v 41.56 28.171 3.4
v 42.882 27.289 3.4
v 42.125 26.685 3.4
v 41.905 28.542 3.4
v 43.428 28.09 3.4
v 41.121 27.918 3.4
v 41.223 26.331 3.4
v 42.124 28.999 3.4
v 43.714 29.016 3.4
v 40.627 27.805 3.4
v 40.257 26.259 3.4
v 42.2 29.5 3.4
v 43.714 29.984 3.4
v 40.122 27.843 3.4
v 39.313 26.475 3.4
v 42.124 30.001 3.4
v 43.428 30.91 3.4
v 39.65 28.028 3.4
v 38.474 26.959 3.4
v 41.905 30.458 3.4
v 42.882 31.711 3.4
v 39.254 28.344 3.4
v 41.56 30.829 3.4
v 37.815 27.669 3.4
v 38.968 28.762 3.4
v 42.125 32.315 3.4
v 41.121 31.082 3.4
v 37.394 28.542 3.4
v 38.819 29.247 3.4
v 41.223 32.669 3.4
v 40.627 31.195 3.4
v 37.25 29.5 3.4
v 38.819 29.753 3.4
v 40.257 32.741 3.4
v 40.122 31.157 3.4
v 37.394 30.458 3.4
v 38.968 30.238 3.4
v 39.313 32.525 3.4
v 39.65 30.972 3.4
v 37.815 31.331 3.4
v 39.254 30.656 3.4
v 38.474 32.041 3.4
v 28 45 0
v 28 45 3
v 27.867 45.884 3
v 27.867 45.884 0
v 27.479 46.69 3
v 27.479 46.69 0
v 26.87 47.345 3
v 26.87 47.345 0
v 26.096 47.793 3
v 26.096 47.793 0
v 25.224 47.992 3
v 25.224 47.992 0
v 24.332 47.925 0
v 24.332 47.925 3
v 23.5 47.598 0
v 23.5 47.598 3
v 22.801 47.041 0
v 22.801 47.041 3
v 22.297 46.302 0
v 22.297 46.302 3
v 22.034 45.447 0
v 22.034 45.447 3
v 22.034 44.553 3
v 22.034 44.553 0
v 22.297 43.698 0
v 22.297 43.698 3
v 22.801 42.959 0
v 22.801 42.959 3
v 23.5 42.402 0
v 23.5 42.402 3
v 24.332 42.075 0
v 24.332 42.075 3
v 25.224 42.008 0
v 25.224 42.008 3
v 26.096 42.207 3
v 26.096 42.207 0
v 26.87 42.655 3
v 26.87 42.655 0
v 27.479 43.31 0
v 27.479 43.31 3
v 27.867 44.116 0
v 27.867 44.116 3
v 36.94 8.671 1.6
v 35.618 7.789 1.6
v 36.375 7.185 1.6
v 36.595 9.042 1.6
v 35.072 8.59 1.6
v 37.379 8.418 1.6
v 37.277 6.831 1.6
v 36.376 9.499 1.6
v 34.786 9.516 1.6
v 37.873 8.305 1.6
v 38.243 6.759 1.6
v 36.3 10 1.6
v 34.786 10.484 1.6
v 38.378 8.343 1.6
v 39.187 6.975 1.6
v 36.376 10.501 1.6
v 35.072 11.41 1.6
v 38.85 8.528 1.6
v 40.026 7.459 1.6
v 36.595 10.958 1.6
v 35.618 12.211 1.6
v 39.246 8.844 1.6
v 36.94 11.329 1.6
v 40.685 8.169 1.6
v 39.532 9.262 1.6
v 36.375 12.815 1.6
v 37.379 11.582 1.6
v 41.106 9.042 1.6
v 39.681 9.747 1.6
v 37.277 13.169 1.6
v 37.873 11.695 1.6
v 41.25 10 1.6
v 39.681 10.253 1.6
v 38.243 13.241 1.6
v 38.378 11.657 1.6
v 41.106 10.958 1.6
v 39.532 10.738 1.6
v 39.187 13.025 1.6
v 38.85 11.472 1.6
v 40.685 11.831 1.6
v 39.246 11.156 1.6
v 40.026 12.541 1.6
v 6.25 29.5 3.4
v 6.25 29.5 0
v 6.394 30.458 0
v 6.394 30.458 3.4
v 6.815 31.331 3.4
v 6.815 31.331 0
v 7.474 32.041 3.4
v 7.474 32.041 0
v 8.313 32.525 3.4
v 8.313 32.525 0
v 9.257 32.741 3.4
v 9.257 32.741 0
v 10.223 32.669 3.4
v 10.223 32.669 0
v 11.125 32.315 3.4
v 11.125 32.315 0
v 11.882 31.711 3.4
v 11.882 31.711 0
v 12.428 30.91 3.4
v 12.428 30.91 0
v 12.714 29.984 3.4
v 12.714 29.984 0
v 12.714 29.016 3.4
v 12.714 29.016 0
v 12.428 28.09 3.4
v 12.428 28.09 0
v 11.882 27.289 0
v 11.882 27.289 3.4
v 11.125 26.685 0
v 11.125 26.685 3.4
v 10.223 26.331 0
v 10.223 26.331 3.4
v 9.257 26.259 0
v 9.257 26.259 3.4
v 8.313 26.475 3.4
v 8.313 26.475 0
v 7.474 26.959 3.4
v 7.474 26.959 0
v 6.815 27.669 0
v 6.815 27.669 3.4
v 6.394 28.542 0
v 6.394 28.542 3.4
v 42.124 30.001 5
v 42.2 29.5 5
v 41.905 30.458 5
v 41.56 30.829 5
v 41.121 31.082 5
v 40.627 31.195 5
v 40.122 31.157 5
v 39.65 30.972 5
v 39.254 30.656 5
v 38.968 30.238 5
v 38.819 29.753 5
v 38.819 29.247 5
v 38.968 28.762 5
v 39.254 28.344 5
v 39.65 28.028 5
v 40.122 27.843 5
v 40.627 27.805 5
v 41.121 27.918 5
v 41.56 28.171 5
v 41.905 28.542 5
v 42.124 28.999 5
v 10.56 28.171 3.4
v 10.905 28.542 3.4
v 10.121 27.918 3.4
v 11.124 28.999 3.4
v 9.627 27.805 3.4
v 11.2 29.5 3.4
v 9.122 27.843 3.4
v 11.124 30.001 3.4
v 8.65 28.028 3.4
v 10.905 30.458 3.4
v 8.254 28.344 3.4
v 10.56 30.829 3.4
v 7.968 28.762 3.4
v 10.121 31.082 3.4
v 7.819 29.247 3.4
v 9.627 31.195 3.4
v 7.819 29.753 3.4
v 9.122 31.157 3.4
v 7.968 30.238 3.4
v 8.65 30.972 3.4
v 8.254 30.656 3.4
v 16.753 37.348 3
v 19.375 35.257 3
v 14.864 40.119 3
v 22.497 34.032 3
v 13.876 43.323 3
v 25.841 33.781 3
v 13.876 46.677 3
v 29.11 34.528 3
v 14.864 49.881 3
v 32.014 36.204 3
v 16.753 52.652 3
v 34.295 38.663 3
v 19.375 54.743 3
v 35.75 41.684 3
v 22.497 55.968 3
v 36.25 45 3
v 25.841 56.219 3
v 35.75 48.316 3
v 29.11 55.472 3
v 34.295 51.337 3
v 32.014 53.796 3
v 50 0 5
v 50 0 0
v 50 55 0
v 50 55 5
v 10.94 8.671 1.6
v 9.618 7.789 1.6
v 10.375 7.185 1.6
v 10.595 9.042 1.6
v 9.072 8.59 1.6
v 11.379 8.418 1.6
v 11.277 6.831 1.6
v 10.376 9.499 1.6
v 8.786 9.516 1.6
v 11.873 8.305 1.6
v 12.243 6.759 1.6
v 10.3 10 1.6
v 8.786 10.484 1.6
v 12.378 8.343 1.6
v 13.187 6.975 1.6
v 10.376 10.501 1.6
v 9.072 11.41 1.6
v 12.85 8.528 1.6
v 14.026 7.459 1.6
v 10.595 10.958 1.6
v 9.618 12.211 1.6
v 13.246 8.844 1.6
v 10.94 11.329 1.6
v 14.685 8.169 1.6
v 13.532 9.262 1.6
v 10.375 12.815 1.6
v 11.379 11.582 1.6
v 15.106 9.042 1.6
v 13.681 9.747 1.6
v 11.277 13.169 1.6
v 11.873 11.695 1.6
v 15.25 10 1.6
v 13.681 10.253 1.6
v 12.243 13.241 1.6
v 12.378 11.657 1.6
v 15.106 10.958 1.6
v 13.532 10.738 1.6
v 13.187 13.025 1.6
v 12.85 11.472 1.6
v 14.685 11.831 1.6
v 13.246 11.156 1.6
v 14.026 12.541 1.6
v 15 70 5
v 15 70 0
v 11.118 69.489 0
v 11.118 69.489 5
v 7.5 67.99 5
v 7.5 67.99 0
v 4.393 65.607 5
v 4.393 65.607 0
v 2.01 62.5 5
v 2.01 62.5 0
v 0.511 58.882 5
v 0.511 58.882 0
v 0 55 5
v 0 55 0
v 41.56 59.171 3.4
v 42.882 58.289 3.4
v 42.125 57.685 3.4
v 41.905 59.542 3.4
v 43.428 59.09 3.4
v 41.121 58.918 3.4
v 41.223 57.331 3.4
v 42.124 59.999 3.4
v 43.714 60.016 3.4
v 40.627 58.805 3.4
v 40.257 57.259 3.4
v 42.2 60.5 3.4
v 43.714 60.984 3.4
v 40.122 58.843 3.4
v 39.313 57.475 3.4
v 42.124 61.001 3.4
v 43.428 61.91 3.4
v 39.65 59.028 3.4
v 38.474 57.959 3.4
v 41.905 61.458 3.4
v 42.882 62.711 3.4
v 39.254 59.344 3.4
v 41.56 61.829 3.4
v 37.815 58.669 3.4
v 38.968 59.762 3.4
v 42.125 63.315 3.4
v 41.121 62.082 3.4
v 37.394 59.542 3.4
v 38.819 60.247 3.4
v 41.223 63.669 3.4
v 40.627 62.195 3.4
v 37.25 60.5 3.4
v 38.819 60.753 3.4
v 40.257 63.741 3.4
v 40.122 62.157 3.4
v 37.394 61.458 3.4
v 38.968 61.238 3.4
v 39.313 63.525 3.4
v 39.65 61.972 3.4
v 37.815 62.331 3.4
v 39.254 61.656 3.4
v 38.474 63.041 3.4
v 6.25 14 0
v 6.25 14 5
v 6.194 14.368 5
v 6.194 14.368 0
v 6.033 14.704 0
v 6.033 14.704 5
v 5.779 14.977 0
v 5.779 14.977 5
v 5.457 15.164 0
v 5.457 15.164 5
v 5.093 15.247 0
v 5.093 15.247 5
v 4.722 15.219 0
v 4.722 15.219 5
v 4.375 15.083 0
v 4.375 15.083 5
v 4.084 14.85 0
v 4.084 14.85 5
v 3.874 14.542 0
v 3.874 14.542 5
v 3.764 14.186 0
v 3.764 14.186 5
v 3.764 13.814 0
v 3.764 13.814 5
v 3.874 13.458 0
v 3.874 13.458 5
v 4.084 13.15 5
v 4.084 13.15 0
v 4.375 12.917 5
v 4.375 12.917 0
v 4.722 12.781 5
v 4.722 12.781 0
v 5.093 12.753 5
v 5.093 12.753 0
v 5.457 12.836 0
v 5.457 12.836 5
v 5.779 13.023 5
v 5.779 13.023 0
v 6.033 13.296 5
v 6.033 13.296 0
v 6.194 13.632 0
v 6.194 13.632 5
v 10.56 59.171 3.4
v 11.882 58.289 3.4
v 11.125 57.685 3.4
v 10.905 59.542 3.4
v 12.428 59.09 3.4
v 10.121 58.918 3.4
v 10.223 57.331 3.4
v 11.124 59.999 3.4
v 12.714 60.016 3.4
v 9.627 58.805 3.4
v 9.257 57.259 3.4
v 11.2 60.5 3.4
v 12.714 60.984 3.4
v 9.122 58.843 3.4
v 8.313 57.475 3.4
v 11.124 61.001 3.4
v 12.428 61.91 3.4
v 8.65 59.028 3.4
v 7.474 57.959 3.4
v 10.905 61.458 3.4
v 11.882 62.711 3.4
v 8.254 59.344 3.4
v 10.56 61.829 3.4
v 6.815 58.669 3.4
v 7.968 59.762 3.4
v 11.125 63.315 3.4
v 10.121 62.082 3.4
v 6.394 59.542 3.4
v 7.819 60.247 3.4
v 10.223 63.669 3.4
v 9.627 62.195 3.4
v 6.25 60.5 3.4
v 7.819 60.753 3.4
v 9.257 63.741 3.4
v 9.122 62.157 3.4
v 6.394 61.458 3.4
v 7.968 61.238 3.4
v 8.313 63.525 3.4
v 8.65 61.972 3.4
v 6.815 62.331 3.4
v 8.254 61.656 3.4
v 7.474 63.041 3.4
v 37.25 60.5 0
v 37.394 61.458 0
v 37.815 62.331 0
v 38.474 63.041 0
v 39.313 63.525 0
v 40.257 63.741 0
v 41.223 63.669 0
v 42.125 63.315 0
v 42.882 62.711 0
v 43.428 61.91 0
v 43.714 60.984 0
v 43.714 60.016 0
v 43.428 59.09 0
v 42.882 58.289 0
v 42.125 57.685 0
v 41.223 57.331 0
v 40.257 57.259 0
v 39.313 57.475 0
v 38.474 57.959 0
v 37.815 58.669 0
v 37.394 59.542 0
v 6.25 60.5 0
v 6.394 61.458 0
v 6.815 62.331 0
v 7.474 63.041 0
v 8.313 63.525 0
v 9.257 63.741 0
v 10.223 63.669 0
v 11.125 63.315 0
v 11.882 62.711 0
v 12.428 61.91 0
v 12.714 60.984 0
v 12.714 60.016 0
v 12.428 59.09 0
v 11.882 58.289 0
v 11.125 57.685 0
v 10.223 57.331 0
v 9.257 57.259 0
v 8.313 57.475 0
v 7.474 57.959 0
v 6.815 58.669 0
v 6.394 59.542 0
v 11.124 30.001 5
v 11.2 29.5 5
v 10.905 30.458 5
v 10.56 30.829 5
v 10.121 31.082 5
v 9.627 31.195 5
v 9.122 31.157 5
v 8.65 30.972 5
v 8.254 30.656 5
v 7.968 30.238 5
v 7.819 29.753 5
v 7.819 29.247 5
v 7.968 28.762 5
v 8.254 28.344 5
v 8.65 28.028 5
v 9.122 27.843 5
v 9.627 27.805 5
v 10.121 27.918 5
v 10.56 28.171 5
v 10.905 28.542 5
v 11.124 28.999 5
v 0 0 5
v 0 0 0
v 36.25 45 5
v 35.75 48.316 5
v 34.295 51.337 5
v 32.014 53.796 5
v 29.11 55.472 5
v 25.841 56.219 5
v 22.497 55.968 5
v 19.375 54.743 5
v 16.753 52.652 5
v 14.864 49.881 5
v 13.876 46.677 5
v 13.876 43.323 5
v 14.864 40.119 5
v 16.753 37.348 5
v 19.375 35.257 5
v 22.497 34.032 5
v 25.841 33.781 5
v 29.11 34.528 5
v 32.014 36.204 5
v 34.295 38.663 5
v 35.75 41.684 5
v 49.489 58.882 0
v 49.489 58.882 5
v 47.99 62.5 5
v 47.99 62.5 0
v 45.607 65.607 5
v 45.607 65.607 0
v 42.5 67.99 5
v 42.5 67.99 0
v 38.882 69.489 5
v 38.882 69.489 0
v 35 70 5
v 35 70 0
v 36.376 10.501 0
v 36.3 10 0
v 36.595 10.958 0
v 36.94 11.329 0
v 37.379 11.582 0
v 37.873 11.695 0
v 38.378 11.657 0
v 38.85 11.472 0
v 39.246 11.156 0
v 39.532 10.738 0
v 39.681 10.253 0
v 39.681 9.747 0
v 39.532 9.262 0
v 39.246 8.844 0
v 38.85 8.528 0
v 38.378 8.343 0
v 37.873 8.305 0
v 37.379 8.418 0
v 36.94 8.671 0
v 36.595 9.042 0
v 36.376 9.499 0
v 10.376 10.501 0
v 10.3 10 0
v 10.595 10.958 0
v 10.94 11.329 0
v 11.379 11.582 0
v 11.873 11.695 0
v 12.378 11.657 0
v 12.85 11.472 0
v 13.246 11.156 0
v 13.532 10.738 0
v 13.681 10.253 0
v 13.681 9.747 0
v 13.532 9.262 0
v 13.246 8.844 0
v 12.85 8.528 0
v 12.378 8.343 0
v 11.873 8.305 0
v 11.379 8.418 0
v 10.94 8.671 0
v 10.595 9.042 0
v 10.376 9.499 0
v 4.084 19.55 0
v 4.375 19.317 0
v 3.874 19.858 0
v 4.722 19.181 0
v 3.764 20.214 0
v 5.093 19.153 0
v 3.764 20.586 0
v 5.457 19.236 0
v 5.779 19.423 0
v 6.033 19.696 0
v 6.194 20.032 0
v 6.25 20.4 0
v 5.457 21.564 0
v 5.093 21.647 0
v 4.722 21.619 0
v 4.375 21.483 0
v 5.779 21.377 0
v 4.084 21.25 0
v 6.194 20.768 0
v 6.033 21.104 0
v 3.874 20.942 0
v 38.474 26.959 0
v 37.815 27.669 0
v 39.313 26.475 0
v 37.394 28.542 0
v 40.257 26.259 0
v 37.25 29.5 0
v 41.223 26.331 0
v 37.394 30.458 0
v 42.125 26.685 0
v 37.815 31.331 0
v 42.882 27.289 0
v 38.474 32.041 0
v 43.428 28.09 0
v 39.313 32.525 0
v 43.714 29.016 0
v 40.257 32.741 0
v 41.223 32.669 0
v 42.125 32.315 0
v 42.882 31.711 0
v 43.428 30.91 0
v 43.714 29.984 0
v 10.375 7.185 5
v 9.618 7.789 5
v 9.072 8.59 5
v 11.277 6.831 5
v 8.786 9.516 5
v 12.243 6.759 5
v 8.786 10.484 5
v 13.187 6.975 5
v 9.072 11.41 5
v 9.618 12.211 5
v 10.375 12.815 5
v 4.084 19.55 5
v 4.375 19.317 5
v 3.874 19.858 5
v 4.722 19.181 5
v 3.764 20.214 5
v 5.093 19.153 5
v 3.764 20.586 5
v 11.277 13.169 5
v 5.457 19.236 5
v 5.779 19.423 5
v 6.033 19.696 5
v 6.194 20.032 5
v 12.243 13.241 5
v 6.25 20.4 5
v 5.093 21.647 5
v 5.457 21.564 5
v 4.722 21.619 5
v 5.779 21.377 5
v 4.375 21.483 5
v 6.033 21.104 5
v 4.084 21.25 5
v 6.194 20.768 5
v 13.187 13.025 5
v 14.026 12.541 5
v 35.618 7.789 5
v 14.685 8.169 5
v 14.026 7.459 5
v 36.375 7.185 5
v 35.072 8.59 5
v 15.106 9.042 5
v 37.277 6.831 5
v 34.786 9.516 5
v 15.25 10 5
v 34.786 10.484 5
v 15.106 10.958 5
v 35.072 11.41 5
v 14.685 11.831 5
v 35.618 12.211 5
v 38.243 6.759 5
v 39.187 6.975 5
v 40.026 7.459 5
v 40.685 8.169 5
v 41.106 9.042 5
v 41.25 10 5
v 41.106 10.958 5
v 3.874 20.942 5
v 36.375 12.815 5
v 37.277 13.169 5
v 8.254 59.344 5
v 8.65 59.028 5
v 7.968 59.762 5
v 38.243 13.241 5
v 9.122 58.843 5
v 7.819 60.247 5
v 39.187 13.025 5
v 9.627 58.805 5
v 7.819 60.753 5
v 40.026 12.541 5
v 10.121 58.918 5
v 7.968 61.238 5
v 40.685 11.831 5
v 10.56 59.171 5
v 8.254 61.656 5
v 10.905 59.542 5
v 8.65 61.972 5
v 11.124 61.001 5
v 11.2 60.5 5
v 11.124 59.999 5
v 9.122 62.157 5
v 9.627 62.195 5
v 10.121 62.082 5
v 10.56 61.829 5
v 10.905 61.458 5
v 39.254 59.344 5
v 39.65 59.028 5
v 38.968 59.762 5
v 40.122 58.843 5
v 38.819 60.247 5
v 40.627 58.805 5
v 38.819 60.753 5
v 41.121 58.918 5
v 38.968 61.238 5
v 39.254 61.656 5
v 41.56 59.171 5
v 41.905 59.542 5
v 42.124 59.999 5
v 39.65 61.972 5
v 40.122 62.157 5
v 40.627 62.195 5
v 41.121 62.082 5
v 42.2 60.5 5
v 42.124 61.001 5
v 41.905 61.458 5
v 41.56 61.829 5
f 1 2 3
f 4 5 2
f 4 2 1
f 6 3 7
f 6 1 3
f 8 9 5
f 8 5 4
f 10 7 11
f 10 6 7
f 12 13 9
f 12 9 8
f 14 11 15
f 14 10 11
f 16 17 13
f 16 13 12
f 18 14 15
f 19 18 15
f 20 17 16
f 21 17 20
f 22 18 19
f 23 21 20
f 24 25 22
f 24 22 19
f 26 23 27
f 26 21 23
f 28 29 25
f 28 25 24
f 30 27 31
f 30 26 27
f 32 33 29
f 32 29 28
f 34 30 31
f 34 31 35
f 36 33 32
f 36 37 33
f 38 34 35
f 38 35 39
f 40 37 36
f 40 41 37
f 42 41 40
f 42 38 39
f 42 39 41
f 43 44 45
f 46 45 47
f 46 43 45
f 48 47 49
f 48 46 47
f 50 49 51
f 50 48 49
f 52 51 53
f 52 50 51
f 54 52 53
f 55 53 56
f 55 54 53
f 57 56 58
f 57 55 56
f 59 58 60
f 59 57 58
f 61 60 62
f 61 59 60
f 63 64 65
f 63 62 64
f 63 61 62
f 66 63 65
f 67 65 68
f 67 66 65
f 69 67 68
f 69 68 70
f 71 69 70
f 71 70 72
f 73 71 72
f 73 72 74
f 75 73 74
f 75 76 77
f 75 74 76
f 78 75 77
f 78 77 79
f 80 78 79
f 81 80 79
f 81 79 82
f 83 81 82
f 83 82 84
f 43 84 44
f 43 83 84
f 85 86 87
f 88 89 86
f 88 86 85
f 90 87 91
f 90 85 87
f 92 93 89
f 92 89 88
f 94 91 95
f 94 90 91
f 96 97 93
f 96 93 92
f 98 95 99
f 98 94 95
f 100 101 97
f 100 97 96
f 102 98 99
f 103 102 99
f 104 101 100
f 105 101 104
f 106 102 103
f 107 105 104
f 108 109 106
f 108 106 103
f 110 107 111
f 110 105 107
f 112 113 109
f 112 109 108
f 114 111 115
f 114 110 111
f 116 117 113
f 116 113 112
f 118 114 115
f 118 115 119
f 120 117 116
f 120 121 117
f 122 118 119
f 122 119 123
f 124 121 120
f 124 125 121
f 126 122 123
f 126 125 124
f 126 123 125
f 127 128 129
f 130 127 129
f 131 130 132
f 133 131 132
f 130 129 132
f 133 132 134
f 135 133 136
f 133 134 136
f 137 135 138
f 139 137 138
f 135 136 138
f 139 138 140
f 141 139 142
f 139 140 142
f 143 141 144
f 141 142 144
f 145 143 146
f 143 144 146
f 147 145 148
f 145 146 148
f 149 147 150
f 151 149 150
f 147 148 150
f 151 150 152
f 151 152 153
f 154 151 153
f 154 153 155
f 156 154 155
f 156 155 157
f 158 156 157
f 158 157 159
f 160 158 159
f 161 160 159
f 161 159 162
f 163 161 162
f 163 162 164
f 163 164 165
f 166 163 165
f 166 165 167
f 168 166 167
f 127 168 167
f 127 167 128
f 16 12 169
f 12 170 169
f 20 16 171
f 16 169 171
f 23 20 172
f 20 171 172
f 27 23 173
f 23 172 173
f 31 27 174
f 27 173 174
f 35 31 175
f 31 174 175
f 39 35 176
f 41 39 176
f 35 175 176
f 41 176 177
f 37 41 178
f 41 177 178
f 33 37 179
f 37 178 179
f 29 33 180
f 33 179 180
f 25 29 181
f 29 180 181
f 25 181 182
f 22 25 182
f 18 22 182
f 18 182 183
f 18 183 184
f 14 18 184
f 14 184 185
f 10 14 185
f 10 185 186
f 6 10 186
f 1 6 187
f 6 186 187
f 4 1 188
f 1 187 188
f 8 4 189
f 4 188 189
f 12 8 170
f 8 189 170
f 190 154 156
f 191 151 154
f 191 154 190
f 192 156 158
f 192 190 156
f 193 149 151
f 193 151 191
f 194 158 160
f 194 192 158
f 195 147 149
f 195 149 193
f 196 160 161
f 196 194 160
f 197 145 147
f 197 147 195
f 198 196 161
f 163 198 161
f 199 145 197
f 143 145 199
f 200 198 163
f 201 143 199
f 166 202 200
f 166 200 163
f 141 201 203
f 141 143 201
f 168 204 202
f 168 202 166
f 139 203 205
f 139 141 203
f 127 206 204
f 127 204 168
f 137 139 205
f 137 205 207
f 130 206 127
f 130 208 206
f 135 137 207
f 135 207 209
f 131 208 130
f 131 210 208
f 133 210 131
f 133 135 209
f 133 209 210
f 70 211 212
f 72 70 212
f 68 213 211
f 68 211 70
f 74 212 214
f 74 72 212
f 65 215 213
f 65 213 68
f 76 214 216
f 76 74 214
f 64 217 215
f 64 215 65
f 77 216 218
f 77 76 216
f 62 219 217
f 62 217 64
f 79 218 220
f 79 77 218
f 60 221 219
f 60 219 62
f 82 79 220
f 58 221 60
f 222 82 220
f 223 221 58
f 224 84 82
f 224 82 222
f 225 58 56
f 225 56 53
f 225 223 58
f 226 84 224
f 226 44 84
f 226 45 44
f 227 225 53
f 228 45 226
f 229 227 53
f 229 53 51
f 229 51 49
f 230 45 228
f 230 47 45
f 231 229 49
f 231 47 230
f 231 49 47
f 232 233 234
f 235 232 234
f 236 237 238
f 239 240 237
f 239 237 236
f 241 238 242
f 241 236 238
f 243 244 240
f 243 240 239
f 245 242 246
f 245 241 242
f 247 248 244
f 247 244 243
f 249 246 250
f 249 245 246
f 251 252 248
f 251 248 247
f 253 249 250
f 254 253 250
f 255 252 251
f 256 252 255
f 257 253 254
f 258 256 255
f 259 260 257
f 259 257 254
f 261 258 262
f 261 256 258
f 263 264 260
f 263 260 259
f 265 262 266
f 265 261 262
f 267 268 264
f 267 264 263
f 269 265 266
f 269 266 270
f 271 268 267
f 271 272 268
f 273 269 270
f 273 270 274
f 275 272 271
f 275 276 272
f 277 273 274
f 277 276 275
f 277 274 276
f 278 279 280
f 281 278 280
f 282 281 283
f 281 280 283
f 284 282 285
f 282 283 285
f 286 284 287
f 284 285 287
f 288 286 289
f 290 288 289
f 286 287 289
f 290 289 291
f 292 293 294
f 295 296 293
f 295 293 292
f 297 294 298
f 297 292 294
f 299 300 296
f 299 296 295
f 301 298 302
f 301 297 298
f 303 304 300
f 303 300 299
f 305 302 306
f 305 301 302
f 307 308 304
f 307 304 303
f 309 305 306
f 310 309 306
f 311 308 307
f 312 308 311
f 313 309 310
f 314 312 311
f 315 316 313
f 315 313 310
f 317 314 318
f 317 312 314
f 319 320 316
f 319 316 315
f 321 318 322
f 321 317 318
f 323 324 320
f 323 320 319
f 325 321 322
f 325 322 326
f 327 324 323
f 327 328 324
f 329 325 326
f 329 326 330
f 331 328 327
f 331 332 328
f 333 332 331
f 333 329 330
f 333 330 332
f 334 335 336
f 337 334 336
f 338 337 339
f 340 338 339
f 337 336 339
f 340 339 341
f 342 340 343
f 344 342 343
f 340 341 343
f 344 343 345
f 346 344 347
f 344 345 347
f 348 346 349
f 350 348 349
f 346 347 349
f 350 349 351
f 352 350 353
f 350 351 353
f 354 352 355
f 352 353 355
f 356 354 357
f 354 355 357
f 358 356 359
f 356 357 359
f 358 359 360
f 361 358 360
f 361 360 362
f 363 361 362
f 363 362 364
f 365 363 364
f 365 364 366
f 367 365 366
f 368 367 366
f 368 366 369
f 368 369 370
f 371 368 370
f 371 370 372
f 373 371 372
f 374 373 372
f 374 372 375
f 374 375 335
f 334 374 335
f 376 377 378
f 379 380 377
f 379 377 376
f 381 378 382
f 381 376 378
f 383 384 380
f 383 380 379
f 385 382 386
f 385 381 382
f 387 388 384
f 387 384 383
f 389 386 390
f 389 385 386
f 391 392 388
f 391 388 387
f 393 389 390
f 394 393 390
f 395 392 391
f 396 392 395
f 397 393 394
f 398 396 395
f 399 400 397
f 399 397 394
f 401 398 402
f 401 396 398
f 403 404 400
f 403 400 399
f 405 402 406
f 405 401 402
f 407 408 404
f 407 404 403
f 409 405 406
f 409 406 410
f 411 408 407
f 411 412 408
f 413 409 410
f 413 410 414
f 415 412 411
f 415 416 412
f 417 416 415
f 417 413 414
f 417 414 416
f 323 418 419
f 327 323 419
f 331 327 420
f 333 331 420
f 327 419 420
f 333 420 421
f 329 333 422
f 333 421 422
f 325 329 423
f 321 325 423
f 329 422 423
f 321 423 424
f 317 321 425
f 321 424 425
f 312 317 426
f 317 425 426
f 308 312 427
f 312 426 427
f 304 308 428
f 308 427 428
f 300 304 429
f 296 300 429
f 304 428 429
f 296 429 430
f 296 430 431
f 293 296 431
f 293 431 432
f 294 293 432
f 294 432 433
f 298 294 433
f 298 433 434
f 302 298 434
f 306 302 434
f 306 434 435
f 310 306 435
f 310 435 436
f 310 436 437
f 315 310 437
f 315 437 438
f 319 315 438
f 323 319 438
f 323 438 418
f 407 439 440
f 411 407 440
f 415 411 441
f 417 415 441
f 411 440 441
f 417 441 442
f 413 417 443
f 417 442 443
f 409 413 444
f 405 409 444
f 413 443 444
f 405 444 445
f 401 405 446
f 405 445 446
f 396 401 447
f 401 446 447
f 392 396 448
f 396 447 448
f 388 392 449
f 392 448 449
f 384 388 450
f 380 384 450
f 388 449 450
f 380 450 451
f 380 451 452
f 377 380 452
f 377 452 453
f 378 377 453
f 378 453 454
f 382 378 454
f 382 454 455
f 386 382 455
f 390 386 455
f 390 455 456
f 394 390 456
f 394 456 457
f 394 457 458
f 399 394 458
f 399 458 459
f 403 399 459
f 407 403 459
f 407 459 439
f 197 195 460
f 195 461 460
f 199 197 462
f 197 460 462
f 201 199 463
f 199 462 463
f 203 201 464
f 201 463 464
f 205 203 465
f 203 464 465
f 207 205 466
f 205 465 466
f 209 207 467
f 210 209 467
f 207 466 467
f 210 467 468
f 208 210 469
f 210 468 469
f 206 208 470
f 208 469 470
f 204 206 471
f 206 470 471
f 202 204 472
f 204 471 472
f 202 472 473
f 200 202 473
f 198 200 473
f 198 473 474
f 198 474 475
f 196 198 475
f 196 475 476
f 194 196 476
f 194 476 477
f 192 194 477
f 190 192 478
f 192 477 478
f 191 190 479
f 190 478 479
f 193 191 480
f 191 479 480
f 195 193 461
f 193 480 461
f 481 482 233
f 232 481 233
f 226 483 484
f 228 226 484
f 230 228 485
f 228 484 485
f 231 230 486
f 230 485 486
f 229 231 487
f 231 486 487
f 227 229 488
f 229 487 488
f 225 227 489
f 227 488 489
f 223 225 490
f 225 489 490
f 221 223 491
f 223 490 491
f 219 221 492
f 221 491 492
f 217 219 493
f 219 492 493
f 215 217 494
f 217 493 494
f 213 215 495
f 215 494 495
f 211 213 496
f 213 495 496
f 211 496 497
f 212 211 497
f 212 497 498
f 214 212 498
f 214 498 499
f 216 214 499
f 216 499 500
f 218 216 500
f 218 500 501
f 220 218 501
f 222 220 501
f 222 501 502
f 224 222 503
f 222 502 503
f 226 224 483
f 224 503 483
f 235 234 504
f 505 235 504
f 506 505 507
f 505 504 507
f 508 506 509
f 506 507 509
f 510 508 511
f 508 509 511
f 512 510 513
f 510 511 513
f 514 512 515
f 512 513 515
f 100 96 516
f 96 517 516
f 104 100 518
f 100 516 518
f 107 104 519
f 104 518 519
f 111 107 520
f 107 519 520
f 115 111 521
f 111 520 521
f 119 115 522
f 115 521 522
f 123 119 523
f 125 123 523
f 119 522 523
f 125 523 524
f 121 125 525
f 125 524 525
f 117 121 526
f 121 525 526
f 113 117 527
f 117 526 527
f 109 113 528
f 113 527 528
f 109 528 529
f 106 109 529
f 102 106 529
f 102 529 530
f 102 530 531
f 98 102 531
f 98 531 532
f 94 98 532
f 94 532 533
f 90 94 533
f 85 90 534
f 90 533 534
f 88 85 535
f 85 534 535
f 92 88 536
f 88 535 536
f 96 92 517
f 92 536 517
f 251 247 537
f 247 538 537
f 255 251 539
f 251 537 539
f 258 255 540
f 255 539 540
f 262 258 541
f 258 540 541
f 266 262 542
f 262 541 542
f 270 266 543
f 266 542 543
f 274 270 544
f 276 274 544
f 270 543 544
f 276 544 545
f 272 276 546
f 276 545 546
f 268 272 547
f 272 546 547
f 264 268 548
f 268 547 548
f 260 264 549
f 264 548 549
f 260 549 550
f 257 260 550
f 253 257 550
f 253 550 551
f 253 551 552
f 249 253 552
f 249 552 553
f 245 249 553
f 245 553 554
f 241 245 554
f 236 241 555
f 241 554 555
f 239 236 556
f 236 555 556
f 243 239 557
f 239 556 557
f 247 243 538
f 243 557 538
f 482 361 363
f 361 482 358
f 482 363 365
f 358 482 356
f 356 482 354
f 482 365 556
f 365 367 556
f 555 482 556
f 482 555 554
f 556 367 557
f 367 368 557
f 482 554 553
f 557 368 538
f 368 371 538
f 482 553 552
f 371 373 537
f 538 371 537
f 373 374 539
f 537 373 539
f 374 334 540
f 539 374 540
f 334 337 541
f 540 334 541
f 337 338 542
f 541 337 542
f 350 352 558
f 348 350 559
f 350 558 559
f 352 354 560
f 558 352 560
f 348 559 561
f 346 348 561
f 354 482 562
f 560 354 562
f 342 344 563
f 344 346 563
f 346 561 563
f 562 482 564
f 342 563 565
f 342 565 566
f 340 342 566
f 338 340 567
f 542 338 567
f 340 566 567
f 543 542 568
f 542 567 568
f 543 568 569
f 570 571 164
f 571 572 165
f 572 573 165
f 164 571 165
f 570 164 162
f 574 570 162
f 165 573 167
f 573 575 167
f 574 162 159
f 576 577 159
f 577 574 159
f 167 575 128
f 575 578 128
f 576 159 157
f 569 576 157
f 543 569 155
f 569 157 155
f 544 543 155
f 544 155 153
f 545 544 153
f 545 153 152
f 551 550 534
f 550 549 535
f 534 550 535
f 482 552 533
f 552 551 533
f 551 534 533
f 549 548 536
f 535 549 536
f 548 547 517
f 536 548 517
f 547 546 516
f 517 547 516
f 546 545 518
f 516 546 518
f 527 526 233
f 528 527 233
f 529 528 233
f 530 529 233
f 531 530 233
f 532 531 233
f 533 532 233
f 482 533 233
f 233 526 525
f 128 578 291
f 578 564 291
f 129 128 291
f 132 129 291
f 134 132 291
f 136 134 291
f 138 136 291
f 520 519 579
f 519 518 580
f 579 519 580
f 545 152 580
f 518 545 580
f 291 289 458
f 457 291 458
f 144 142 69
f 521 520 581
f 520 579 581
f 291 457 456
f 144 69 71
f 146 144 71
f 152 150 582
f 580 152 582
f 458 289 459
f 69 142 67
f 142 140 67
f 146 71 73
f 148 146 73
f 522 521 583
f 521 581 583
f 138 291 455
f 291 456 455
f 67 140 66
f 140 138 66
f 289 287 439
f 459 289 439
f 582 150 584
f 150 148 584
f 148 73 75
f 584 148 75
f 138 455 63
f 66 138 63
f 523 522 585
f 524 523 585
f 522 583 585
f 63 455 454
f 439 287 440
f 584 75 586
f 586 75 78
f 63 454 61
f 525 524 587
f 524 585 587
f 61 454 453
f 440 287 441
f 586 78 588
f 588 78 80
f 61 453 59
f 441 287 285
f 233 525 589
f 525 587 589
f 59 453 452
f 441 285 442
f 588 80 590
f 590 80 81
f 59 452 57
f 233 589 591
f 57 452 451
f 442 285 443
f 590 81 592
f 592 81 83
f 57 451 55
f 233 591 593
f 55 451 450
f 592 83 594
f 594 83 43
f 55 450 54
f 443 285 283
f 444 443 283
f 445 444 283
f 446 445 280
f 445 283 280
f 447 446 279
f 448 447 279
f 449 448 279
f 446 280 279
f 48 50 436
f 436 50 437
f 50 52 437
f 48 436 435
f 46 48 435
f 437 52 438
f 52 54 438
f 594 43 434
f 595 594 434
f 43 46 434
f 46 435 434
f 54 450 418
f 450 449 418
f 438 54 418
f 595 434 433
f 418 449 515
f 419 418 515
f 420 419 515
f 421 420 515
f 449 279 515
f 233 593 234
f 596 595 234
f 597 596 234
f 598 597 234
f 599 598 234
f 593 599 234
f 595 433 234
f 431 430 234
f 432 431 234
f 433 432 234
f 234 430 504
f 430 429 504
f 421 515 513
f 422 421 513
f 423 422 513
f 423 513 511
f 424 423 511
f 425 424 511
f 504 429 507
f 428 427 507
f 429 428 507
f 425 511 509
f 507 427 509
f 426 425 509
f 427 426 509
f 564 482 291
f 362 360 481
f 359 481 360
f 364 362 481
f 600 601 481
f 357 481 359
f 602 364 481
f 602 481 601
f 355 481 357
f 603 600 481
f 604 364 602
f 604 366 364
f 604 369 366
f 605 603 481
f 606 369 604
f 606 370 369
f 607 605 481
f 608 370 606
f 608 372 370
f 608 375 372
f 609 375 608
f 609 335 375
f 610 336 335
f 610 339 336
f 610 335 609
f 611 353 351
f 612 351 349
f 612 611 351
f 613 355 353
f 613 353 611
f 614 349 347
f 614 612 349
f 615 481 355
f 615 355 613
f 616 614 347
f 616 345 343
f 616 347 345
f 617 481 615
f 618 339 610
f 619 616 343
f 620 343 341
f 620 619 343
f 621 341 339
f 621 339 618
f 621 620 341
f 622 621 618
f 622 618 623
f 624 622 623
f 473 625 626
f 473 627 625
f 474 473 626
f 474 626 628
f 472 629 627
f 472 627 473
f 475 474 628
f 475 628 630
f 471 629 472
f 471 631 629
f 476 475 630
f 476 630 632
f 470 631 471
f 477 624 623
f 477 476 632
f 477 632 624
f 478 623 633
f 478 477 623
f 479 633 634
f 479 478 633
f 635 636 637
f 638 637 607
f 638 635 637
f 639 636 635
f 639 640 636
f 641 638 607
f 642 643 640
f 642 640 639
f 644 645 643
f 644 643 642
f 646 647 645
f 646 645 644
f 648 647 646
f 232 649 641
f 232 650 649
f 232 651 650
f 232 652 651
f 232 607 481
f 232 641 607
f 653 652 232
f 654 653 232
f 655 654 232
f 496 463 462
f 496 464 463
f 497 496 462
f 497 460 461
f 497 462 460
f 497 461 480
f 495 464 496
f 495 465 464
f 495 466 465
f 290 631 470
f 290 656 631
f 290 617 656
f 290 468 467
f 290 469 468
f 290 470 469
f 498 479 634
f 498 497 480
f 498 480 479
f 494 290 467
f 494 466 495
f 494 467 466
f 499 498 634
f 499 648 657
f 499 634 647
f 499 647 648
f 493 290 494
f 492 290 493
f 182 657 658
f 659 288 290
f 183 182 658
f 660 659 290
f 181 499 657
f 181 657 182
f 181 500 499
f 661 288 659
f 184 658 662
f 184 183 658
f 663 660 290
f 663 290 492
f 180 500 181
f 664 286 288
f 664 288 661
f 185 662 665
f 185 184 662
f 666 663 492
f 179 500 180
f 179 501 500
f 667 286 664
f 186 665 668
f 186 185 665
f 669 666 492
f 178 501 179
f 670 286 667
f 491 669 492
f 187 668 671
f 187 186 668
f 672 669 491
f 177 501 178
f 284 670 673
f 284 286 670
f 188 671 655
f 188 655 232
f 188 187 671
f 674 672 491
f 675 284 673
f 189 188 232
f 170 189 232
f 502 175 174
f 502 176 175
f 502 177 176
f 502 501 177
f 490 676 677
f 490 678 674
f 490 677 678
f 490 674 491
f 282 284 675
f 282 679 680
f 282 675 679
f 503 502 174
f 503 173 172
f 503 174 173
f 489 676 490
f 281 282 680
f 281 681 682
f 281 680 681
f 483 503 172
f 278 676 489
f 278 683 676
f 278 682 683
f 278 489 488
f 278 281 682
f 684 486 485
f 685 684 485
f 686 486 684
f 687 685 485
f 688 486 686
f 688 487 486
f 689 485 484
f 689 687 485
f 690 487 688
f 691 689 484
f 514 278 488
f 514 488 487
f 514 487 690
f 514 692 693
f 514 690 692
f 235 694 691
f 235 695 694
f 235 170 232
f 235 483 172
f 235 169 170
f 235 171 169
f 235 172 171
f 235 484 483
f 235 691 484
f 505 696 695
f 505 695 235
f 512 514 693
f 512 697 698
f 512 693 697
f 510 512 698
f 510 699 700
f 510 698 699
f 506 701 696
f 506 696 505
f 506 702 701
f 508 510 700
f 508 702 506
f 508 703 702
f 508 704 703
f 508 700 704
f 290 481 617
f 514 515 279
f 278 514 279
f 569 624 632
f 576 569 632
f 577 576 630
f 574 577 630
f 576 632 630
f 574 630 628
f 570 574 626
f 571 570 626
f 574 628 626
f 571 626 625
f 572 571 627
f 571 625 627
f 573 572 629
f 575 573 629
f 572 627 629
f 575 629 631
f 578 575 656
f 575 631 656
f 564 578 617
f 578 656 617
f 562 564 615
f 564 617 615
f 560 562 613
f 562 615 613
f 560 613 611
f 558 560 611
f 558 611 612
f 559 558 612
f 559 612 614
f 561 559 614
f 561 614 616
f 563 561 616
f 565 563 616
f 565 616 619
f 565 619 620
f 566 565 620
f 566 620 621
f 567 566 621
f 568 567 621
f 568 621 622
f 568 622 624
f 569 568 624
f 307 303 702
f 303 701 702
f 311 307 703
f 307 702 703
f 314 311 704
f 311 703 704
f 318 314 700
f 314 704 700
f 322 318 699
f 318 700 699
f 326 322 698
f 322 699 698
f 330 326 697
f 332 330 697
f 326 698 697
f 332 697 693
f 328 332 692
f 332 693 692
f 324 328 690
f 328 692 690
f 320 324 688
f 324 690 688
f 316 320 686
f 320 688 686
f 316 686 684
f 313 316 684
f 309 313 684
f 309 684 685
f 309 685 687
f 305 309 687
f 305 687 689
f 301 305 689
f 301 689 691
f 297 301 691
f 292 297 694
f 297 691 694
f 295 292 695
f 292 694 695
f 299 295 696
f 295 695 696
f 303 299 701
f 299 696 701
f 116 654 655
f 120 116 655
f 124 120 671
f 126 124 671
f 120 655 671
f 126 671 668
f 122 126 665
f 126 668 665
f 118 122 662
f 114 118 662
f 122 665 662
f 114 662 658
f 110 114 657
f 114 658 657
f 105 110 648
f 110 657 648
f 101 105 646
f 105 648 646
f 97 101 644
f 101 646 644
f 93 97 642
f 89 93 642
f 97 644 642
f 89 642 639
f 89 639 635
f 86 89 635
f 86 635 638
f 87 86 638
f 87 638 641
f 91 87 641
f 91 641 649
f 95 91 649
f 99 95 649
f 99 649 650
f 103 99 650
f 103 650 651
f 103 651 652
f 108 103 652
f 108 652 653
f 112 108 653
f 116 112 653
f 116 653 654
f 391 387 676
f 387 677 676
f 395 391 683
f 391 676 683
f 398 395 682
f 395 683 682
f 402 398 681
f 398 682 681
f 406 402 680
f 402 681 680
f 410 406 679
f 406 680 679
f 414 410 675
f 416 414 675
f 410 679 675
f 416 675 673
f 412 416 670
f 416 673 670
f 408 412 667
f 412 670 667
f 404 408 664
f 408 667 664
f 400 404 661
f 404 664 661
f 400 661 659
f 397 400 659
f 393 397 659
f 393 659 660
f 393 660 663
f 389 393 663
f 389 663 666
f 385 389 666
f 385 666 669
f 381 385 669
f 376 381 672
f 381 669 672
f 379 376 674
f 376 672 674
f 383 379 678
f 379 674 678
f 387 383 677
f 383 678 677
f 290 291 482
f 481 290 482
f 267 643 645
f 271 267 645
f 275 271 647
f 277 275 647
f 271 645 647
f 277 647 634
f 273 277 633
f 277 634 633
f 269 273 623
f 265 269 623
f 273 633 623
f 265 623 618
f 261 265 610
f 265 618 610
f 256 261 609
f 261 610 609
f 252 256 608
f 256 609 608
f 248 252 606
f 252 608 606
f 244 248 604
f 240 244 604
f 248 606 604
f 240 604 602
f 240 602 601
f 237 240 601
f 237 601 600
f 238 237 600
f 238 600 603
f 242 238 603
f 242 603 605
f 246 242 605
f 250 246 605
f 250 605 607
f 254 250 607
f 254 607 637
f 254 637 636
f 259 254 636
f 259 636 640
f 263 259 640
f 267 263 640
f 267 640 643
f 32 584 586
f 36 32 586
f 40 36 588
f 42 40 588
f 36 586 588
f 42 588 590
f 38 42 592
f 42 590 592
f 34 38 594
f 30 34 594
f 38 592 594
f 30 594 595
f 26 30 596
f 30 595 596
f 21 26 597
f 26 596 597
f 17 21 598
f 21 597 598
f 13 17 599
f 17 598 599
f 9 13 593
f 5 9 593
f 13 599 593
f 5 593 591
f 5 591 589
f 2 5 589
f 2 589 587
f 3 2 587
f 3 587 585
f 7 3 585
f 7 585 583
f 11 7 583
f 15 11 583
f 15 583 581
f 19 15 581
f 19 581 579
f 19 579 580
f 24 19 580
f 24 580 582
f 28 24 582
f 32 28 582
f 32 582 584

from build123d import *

# Parameters (mm, degrees)
SKIZZE1_R                                            = 3
AUFSATZ_LINEAR_AUSTRAGEN1_DEPTH                      = 5
SKIZZE3_R                                            = 11.25
SCHNITT_LINEAR_AUSTRAGEN1_DEPTH                      = 2
STIRNSENKUNG_F_R_M3_ZYLINDERSCHRAUBE_MIT_D           = 3.4
STIRNSENKUNG_F_R_M3_ZYLINDERSCHRAUBE_MIT_CBORE_D     = 6.5
STIRNSENKUNG_F_R_M3_ZYLINDERSCHRAUBE_MIT_CBORE_DEPTH = 3.4
STIRNSENKUNG_F_R_M3_ZYLINDERSCHRAUBE_2_D             = 3.4
STIRNSENKUNG_F_R_M3_ZYLINDERSCHRAUBE_2_CBORE_D       = 6.5
STIRNSENKUNG_F_R_M3_ZYLINDERSCHRAUBE_2_CBORE_DEPTH   = 3.4
F_2_5_2_5_DURCHMESSER_BOHRUNG1_D                     = 2.5
F_2_5_2_5_DURCHMESSER_BOHRUNG1_DEPTH                 = 5


with BuildPart() as part:
    # Skizze1 → Aufsatz-Linear austragen1 (new body)
    with BuildSketch(Plane.XY):
        with BuildLine():
            Line((0, 0), (50, 0))
            Line((50, 0), (50, 55))
            ThreePointArc((50, 55), (45.606601718, 65.606601718), (35, 70))
            Line((35, 70), (15, 70))
            ThreePointArc((15, 70), (4.393398282, 65.606601718), (0, 55))
            Line((0, 55), (0, 0))
        make_face()
        with Locations((25, 45)):
            Circle(SKIZZE1_R, mode=Mode.SUBTRACT)
    extrude(amount=AUFSATZ_LINEAR_AUSTRAGEN1_DEPTH)

    # Skizze3 → Schnitt-Linear austragen1 (cut)
    with BuildSketch(Plane.XY.offset(5)):
        with Locations((25, 45)):
            Circle(SKIZZE3_R)
    extrude(amount=-SCHNITT_LINEAR_AUSTRAGEN1_DEPTH, mode=Mode.SUBTRACT)

    # Stirnsenkung f_r M3 Zylinderschraube mit (through all)
    with Locations(Plane(origin=(0, 0, 0), x_dir=(-1, 0, 0), z_dir=(0, 0, -1))):
        with Locations((-9.5, 29.5), (-9.5, 60.5), (-40.5, 60.5), (-40.5, 29.5)):
            CounterBoreHole(STIRNSENKUNG_F_R_M3_ZYLINDERSCHRAUBE_MIT_D / 2, STIRNSENKUNG_F_R_M3_ZYLINDERSCHRAUBE_MIT_CBORE_D / 2, STIRNSENKUNG_F_R_M3_ZYLINDERSCHRAUBE_MIT_CBORE_DEPTH)

    # Stirnsenkung f_r M3 Zylinderschraube 2 (through all)
    with Locations(Plane.XY.offset(5)):
        with Locations((38, 10), (12, 10)):
            CounterBoreHole(STIRNSENKUNG_F_R_M3_ZYLINDERSCHRAUBE_2_D / 2, STIRNSENKUNG_F_R_M3_ZYLINDERSCHRAUBE_2_CBORE_D / 2, STIRNSENKUNG_F_R_M3_ZYLINDERSCHRAUBE_2_CBORE_DEPTH)

    # Ø2.5 (2.5) Durchmesser Bohrung1
    with Locations(Plane(origin=(0, 0, 0), x_dir=(-1, 0, 0), z_dir=(0, 0, -1))):
        with Locations((-5, 20.4), (-5, 14)):
            Hole(F_2_5_2_5_DURCHMESSER_BOHRUNG1_D / 2, depth=F_2_5_2_5_DURCHMESSER_BOHRUNG1_DEPTH)


solid = part.part
